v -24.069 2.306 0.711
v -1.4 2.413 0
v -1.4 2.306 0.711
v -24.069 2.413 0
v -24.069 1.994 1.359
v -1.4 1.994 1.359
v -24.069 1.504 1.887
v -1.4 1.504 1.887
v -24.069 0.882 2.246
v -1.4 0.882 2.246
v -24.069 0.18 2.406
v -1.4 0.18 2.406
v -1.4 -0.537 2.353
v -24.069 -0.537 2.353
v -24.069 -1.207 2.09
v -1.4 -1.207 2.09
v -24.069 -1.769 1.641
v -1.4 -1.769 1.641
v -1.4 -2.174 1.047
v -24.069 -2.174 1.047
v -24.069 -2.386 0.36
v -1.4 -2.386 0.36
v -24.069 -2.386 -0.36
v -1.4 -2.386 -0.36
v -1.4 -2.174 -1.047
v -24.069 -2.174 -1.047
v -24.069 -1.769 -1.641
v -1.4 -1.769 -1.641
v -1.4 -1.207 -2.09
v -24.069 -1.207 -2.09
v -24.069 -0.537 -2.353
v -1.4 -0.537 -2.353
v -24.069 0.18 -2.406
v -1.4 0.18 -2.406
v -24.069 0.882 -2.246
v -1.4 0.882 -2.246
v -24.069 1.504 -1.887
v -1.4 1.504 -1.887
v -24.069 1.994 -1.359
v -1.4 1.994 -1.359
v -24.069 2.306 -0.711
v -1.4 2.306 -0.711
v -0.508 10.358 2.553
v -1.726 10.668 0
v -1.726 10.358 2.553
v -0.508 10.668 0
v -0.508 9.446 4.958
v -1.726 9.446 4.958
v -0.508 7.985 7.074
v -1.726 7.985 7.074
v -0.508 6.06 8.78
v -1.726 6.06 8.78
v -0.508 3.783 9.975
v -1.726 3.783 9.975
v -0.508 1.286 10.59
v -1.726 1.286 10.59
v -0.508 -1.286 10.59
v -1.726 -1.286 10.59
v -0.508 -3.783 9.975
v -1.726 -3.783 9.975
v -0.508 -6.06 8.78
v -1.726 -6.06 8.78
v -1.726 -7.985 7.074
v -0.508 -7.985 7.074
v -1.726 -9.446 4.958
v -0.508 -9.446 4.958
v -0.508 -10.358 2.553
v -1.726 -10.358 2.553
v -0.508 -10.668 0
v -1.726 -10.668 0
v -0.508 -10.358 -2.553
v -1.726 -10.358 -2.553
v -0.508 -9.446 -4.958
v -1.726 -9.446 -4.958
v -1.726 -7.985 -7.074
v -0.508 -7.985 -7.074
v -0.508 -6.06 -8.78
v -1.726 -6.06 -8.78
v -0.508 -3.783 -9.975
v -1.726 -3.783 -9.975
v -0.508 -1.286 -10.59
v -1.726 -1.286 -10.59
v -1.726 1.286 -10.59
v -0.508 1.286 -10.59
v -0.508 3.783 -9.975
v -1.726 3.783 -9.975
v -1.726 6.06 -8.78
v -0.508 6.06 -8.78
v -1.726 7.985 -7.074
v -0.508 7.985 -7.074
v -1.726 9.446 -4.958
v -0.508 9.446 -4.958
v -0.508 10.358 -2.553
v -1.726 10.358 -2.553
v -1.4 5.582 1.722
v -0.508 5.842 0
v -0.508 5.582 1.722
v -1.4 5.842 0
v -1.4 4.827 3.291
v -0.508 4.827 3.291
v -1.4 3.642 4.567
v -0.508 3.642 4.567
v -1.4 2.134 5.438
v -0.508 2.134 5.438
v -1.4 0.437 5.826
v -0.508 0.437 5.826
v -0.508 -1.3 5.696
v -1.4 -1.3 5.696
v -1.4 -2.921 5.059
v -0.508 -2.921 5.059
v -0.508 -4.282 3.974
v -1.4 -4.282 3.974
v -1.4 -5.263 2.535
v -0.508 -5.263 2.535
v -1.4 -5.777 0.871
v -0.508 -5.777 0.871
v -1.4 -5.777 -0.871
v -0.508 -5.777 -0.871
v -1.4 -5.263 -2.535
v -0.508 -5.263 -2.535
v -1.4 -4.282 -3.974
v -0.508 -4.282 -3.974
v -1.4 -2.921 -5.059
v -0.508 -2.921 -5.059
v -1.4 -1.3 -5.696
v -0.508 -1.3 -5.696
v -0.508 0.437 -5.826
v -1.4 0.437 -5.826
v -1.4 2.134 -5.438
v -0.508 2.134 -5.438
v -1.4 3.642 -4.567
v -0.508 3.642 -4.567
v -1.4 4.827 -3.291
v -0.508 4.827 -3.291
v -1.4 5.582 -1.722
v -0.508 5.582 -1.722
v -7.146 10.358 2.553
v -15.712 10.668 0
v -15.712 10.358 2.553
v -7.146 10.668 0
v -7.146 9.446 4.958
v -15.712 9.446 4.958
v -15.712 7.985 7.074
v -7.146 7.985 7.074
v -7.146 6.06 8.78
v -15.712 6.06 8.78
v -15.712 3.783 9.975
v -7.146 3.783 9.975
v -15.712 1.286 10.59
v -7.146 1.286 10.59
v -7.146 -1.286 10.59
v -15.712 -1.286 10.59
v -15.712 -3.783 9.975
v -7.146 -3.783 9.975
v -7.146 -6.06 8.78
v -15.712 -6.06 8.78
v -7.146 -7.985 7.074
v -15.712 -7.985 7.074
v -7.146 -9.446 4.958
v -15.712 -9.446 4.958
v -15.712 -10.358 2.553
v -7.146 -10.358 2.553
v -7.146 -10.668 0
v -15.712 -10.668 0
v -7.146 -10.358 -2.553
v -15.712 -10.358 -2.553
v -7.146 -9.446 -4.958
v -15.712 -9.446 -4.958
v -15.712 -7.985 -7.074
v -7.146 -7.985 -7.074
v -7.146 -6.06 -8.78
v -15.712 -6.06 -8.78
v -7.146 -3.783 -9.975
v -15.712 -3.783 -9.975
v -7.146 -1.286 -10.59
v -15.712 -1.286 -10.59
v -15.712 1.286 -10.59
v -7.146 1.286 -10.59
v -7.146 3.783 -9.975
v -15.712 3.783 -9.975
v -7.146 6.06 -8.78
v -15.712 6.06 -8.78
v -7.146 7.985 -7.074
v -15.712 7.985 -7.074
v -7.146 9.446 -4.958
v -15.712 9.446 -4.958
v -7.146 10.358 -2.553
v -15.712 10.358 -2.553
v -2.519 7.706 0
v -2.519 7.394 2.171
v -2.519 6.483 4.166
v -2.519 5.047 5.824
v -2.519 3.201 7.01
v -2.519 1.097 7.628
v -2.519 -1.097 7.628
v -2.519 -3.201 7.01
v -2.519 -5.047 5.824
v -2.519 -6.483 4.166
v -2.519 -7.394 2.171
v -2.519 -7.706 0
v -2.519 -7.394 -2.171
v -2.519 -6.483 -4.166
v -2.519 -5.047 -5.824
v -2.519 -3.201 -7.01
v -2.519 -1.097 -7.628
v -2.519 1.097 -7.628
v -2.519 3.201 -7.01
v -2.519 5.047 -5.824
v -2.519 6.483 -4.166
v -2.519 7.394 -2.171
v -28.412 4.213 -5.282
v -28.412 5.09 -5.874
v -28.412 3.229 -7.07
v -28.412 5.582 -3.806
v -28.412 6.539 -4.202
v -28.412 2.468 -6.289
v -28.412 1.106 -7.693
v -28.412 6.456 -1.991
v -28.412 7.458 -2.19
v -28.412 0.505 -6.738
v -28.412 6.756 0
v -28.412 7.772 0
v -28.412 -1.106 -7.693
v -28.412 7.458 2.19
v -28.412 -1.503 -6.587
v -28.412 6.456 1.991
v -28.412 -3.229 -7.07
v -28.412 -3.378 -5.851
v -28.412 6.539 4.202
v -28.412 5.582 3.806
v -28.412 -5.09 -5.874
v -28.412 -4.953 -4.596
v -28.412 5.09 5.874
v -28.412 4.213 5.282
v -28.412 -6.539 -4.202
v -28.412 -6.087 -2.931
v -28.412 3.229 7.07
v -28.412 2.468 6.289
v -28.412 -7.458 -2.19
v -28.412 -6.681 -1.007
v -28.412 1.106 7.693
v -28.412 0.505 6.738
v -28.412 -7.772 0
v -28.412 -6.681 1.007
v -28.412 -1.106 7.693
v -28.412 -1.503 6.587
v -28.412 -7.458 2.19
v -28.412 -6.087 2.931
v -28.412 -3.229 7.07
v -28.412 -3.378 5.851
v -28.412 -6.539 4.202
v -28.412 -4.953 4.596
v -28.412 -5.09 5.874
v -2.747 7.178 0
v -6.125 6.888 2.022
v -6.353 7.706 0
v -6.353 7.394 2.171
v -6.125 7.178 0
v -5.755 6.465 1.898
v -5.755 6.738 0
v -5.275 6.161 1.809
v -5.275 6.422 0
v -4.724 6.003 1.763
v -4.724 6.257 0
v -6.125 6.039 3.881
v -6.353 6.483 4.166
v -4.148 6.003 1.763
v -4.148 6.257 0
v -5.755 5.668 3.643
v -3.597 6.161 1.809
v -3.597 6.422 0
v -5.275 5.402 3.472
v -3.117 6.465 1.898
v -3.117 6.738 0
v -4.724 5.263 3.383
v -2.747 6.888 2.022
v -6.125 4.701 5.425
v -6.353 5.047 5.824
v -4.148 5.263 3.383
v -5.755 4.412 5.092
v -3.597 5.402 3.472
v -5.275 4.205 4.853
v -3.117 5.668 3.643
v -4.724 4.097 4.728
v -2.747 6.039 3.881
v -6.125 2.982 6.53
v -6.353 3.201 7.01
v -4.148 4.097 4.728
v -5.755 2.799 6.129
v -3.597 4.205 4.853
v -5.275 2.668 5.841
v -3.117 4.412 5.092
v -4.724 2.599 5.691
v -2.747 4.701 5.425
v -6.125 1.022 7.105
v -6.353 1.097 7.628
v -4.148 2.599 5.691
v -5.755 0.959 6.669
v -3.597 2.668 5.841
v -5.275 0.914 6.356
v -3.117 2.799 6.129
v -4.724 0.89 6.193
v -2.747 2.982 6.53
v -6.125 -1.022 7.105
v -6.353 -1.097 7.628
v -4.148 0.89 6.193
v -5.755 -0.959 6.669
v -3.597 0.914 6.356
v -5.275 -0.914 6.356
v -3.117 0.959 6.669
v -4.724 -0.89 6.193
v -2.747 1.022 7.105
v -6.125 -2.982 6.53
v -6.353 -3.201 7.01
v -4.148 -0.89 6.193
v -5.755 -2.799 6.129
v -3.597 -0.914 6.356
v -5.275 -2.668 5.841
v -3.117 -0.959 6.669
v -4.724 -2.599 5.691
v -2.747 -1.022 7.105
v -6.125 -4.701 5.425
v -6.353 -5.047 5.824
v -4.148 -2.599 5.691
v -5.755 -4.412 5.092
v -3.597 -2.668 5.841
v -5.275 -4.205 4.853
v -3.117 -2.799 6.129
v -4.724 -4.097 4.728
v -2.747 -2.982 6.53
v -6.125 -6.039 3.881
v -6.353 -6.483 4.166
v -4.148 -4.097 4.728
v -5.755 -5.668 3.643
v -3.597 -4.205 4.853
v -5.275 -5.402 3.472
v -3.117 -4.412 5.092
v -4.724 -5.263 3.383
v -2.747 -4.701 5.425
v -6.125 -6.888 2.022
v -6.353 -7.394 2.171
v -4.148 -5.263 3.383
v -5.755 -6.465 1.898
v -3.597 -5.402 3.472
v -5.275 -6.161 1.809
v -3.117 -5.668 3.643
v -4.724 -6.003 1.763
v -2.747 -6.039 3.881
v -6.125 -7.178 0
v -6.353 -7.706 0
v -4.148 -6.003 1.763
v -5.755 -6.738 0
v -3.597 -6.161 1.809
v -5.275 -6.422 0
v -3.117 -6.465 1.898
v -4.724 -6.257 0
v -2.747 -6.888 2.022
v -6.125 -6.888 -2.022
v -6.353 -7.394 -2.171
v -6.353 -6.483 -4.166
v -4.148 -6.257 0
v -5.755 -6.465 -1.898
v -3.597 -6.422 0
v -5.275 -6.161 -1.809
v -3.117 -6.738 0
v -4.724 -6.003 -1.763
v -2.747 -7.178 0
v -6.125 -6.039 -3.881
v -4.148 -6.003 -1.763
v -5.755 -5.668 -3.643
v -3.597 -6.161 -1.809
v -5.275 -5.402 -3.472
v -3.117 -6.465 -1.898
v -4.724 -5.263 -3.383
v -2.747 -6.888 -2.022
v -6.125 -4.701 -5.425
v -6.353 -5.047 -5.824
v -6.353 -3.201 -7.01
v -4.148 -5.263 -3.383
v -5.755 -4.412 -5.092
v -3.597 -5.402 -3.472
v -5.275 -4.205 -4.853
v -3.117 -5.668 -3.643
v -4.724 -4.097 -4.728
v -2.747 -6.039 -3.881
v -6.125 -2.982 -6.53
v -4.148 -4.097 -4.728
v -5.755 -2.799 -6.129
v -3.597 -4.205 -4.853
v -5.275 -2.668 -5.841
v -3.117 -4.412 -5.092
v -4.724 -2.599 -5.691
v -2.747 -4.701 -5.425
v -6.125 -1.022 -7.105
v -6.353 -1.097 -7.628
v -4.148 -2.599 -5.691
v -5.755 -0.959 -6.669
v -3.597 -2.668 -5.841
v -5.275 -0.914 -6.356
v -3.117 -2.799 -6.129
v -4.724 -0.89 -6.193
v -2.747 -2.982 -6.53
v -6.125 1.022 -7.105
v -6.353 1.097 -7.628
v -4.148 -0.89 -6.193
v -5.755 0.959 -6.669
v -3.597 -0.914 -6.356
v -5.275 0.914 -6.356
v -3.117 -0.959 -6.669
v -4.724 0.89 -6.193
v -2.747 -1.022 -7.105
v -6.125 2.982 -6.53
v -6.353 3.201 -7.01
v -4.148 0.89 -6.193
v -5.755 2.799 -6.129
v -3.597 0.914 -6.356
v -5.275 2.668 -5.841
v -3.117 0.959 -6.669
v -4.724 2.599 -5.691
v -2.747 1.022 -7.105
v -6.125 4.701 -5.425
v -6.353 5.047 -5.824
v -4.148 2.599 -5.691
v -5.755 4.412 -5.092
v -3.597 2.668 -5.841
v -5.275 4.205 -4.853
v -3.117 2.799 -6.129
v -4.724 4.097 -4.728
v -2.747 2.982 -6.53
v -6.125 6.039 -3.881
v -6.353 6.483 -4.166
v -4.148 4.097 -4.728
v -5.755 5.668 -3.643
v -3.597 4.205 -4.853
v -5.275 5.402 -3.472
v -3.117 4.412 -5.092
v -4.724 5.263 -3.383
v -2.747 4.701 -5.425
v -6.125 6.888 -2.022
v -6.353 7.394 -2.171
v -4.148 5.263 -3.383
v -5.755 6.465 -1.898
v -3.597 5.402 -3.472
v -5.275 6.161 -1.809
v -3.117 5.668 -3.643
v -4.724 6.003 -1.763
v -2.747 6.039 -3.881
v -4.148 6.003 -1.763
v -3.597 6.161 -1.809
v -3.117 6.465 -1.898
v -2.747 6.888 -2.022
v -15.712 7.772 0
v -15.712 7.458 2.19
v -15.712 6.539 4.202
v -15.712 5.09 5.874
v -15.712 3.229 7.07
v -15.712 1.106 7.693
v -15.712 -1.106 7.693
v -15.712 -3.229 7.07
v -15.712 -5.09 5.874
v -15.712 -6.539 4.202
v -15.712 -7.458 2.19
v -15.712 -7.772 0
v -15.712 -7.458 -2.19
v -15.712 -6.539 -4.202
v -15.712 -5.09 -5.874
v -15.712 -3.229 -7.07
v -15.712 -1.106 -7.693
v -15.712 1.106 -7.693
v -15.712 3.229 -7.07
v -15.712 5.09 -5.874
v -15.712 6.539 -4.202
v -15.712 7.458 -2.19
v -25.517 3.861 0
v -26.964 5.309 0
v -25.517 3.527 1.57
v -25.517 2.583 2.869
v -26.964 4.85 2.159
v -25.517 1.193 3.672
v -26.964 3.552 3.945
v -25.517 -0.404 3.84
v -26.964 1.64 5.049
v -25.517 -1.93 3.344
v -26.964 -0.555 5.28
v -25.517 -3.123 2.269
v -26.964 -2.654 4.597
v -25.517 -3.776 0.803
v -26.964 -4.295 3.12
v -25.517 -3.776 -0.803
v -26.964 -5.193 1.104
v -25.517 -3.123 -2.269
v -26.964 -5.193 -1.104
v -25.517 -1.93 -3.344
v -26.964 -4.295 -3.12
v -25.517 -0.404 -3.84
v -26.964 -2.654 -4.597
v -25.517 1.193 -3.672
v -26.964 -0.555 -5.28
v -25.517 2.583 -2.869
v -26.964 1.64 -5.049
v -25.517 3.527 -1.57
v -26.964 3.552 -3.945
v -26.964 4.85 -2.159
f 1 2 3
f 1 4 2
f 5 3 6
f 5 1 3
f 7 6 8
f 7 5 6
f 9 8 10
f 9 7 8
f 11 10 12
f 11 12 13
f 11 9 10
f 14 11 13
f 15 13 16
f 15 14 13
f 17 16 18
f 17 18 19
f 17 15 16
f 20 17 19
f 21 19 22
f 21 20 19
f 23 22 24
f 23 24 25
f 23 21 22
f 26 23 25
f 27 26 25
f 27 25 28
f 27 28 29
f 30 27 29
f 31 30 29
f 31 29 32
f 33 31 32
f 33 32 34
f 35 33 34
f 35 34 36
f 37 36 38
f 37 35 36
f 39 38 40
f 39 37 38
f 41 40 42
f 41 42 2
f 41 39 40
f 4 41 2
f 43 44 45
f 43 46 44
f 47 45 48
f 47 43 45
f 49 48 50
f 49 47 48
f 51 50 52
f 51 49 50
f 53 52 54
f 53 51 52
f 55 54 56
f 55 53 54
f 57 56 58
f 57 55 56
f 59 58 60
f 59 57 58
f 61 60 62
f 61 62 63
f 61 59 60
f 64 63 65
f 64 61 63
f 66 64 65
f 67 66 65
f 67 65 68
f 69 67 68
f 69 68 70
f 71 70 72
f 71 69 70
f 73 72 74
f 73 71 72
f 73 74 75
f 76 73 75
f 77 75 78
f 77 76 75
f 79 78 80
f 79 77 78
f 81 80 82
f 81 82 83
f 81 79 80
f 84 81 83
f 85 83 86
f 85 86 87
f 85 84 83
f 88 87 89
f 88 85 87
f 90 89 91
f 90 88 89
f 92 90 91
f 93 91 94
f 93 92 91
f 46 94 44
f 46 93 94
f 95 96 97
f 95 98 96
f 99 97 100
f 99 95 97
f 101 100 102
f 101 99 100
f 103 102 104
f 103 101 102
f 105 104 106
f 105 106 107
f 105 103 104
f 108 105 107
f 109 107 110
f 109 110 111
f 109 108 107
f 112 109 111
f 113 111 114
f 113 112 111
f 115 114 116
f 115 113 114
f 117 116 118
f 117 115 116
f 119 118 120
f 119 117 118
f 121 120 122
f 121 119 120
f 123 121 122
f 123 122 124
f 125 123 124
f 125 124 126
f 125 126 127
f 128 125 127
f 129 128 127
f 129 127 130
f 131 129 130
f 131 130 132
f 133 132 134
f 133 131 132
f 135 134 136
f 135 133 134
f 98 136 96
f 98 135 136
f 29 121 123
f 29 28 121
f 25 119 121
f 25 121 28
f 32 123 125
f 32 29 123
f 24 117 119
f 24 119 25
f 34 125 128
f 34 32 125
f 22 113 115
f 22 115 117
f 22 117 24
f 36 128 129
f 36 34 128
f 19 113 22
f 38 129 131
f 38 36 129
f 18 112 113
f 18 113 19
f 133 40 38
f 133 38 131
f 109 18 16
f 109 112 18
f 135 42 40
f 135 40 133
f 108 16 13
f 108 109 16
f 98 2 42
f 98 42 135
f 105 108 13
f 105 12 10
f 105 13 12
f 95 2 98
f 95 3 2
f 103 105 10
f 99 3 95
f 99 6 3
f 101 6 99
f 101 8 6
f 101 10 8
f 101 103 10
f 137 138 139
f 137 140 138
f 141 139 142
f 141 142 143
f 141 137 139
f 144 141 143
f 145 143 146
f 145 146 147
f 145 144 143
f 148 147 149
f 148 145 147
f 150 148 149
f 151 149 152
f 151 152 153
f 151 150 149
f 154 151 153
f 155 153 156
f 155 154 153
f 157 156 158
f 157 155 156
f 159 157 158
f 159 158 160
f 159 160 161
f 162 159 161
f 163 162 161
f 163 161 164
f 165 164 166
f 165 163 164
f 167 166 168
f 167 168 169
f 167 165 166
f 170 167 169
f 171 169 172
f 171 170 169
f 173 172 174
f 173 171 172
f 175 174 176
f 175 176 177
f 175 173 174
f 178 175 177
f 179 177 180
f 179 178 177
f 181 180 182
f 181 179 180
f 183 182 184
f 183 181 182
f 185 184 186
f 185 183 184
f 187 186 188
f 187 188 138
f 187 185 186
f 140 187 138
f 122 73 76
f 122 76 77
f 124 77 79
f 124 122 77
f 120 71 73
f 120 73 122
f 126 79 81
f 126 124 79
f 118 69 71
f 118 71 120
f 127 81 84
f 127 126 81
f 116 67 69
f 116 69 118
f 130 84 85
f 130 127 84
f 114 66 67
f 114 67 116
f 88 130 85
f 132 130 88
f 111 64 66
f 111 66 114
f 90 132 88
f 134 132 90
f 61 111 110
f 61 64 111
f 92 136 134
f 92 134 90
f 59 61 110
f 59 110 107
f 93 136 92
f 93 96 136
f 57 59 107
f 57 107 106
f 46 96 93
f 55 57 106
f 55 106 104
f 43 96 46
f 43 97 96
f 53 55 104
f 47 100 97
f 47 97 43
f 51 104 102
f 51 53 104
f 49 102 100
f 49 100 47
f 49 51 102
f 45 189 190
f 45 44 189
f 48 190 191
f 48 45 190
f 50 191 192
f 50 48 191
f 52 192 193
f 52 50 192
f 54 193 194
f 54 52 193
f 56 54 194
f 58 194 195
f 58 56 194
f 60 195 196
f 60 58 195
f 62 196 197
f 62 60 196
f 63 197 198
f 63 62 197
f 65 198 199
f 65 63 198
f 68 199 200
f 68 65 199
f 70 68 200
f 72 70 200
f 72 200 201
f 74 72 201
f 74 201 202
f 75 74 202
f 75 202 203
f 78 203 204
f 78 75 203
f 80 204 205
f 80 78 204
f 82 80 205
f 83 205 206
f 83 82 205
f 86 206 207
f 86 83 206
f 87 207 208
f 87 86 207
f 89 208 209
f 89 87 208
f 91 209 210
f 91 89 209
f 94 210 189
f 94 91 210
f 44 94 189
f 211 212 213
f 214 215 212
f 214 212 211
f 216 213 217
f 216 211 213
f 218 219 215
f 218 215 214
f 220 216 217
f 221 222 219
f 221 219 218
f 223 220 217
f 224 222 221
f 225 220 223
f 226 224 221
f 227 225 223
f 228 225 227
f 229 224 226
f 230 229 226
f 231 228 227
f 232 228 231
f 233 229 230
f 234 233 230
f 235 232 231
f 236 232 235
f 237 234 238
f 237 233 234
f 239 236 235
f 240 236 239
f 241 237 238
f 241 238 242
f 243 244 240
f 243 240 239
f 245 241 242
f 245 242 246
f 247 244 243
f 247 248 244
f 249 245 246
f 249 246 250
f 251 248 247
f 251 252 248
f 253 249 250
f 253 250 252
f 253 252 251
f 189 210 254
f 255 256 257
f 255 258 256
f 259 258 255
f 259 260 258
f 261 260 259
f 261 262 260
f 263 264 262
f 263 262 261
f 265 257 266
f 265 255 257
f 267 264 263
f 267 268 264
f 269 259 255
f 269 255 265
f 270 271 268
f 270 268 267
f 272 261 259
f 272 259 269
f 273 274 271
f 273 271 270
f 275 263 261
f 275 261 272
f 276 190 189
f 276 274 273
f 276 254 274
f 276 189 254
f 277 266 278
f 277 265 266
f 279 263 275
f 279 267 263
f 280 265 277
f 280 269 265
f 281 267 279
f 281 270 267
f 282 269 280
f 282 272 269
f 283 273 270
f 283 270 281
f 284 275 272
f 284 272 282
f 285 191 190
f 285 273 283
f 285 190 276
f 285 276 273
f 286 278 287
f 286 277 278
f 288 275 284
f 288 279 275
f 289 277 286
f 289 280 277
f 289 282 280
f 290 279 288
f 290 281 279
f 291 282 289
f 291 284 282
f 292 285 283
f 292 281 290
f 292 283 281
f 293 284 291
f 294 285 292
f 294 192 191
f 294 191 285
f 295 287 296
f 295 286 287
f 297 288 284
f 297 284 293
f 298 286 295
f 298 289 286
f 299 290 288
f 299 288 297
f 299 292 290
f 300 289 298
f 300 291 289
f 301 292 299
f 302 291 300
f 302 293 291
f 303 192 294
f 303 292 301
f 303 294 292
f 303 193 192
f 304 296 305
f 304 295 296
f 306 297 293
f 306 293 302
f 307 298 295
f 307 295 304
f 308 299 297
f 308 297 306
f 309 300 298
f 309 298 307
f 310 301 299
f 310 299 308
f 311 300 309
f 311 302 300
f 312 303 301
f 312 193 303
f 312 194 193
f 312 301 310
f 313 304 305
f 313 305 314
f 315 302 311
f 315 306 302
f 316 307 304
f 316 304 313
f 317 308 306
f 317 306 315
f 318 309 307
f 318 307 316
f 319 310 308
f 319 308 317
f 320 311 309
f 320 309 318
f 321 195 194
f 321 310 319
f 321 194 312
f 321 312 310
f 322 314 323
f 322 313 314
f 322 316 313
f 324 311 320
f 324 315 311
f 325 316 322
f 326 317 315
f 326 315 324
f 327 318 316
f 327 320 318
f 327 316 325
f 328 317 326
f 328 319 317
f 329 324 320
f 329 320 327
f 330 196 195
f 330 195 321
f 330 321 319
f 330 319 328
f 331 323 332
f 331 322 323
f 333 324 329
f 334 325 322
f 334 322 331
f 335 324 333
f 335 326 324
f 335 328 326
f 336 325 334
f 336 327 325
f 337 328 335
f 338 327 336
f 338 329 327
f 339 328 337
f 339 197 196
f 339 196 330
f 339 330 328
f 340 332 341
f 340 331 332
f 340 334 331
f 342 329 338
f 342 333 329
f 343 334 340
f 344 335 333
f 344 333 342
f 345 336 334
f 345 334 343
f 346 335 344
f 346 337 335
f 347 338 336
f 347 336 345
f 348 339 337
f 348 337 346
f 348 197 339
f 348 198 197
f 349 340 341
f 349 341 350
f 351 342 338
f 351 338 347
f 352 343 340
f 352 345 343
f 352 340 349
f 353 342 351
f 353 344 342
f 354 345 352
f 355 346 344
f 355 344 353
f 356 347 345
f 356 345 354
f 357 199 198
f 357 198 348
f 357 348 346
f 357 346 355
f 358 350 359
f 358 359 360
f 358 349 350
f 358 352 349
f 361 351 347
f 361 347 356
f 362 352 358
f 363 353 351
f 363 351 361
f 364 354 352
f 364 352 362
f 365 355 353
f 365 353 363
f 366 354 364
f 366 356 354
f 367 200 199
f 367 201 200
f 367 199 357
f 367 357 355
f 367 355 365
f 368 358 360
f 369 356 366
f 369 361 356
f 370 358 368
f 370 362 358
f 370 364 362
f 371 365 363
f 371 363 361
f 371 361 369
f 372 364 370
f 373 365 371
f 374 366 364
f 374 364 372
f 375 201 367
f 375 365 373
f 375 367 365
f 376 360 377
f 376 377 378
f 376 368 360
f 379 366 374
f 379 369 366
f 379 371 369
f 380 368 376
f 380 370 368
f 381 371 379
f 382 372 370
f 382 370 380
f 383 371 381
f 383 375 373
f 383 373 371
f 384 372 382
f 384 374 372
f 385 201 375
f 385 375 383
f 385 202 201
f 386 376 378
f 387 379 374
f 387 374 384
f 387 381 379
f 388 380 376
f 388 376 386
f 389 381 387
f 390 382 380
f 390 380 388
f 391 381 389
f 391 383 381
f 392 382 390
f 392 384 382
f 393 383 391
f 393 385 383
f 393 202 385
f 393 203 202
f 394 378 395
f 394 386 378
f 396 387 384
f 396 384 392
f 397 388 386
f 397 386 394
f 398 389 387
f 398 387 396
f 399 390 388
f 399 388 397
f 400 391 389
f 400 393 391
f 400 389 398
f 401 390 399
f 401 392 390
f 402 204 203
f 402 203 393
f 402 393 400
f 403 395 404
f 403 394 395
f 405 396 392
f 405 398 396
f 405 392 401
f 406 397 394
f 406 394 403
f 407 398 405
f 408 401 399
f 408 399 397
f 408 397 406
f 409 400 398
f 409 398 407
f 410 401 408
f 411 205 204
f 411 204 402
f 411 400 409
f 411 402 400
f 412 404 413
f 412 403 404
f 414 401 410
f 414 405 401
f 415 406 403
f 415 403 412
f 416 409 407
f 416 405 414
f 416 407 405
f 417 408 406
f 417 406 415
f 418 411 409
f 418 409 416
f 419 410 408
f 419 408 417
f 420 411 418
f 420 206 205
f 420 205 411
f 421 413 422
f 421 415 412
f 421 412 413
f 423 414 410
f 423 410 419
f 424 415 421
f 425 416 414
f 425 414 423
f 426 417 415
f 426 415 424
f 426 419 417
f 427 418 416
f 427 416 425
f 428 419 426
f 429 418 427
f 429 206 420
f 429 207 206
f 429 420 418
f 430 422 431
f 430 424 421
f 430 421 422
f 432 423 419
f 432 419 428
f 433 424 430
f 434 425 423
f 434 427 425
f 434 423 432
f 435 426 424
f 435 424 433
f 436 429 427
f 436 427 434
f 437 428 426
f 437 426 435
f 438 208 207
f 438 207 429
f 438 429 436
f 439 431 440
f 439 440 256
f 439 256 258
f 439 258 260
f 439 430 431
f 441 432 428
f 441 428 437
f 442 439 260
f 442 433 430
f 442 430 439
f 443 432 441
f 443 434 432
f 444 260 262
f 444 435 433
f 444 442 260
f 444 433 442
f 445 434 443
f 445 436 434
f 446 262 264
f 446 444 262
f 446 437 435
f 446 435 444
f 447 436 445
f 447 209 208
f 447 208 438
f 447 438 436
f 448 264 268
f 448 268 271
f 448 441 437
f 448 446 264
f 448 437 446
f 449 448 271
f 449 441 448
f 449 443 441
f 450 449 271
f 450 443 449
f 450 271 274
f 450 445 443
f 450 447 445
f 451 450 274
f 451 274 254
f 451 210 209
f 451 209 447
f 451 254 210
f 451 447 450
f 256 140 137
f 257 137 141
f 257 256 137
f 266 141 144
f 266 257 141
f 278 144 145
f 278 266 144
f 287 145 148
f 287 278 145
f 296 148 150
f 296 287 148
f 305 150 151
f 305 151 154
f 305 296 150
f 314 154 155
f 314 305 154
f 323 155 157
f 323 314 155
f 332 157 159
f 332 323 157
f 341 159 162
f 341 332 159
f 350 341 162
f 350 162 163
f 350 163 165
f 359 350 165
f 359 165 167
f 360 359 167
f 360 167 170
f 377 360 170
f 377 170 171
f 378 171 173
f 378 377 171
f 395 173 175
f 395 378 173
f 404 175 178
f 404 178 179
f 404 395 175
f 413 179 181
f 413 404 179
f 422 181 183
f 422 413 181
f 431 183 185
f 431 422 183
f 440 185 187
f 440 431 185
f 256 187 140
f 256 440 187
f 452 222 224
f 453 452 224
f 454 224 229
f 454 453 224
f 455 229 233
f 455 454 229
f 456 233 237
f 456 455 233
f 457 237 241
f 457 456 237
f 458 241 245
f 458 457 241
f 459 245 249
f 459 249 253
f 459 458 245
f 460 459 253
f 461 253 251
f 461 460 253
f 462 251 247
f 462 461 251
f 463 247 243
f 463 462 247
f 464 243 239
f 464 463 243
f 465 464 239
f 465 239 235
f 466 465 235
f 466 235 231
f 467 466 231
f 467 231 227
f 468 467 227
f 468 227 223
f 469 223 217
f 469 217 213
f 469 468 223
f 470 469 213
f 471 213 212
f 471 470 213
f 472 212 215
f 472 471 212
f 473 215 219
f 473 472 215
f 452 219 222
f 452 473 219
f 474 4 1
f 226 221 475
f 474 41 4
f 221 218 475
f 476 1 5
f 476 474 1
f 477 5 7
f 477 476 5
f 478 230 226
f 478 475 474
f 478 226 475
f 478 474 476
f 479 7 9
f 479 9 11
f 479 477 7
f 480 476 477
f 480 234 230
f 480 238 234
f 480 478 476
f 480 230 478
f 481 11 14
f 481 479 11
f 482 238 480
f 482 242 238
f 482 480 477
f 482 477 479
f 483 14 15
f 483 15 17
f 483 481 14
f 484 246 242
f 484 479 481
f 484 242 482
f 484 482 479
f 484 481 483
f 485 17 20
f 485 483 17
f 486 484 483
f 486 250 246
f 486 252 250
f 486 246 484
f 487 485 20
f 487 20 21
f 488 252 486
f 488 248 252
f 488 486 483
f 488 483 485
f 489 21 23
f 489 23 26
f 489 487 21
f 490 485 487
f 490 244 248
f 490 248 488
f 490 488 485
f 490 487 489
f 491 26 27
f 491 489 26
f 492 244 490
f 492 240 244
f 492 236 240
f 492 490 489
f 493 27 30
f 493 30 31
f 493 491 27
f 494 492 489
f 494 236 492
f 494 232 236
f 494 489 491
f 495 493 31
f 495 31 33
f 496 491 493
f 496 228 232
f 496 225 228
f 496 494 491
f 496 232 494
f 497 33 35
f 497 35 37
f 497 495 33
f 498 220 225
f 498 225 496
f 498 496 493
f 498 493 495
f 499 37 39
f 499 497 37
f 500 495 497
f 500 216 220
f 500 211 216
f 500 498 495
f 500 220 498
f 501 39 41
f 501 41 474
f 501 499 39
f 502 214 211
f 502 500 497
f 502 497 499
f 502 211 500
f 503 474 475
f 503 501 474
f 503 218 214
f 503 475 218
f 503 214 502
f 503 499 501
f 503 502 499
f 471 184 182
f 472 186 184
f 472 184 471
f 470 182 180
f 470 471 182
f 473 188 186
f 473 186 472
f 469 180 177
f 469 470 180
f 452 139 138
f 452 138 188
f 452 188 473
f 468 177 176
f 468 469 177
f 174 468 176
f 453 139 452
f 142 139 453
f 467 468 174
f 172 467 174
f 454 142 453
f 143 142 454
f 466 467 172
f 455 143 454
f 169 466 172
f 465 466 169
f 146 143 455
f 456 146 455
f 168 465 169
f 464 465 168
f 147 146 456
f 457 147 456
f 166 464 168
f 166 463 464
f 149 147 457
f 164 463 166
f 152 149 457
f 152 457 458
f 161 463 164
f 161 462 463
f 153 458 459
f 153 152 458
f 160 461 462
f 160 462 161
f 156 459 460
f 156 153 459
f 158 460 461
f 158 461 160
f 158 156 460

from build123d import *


with BuildPart() as part:
    # Sketch1 → Revolve1 (revolve)
    with BuildSketch(Plane.XY):
        with BuildLine():
            Line((-2.519270709, 7.706480957), (-1.725734073, 10.668))
            Line((-1.725734073, 10.668), (-0.508, 10.668))
            Line((-0.508, 10.668), (-0.508, 5.842))
            Line((-0.508, 5.842), (-1.4, 5.842))
            Line((-1.4, 5.842), (-1.4, 2.413))
            Line((-1.4, 2.413), (-24.068719082, 2.413))
            Line((-24.068719082, 2.413), (-28.412119082, 6.7564))
            Line((-28.412119082, 6.7564), (-28.412119082, 7.7724))
            Line((-28.412119082, 7.7724), (-15.712119082, 7.7724))
            Line((-15.712119082, 7.7724), (-15.712119082, 10.668))
            Line((-15.712119082, 10.668), (-7.146325468, 10.668))
            Line((-7.146325468, 10.668), (-6.352788832, 7.706480957))
            ThreePointArc((-6.352788832, 7.706480957), (-4.43602977, 6.2357), (-2.519270709, 7.706480957))
        make_face()
    revolve(axis=Axis((-22.598839253, 0, 0), (1, 0, 0)))


solid = part.part
